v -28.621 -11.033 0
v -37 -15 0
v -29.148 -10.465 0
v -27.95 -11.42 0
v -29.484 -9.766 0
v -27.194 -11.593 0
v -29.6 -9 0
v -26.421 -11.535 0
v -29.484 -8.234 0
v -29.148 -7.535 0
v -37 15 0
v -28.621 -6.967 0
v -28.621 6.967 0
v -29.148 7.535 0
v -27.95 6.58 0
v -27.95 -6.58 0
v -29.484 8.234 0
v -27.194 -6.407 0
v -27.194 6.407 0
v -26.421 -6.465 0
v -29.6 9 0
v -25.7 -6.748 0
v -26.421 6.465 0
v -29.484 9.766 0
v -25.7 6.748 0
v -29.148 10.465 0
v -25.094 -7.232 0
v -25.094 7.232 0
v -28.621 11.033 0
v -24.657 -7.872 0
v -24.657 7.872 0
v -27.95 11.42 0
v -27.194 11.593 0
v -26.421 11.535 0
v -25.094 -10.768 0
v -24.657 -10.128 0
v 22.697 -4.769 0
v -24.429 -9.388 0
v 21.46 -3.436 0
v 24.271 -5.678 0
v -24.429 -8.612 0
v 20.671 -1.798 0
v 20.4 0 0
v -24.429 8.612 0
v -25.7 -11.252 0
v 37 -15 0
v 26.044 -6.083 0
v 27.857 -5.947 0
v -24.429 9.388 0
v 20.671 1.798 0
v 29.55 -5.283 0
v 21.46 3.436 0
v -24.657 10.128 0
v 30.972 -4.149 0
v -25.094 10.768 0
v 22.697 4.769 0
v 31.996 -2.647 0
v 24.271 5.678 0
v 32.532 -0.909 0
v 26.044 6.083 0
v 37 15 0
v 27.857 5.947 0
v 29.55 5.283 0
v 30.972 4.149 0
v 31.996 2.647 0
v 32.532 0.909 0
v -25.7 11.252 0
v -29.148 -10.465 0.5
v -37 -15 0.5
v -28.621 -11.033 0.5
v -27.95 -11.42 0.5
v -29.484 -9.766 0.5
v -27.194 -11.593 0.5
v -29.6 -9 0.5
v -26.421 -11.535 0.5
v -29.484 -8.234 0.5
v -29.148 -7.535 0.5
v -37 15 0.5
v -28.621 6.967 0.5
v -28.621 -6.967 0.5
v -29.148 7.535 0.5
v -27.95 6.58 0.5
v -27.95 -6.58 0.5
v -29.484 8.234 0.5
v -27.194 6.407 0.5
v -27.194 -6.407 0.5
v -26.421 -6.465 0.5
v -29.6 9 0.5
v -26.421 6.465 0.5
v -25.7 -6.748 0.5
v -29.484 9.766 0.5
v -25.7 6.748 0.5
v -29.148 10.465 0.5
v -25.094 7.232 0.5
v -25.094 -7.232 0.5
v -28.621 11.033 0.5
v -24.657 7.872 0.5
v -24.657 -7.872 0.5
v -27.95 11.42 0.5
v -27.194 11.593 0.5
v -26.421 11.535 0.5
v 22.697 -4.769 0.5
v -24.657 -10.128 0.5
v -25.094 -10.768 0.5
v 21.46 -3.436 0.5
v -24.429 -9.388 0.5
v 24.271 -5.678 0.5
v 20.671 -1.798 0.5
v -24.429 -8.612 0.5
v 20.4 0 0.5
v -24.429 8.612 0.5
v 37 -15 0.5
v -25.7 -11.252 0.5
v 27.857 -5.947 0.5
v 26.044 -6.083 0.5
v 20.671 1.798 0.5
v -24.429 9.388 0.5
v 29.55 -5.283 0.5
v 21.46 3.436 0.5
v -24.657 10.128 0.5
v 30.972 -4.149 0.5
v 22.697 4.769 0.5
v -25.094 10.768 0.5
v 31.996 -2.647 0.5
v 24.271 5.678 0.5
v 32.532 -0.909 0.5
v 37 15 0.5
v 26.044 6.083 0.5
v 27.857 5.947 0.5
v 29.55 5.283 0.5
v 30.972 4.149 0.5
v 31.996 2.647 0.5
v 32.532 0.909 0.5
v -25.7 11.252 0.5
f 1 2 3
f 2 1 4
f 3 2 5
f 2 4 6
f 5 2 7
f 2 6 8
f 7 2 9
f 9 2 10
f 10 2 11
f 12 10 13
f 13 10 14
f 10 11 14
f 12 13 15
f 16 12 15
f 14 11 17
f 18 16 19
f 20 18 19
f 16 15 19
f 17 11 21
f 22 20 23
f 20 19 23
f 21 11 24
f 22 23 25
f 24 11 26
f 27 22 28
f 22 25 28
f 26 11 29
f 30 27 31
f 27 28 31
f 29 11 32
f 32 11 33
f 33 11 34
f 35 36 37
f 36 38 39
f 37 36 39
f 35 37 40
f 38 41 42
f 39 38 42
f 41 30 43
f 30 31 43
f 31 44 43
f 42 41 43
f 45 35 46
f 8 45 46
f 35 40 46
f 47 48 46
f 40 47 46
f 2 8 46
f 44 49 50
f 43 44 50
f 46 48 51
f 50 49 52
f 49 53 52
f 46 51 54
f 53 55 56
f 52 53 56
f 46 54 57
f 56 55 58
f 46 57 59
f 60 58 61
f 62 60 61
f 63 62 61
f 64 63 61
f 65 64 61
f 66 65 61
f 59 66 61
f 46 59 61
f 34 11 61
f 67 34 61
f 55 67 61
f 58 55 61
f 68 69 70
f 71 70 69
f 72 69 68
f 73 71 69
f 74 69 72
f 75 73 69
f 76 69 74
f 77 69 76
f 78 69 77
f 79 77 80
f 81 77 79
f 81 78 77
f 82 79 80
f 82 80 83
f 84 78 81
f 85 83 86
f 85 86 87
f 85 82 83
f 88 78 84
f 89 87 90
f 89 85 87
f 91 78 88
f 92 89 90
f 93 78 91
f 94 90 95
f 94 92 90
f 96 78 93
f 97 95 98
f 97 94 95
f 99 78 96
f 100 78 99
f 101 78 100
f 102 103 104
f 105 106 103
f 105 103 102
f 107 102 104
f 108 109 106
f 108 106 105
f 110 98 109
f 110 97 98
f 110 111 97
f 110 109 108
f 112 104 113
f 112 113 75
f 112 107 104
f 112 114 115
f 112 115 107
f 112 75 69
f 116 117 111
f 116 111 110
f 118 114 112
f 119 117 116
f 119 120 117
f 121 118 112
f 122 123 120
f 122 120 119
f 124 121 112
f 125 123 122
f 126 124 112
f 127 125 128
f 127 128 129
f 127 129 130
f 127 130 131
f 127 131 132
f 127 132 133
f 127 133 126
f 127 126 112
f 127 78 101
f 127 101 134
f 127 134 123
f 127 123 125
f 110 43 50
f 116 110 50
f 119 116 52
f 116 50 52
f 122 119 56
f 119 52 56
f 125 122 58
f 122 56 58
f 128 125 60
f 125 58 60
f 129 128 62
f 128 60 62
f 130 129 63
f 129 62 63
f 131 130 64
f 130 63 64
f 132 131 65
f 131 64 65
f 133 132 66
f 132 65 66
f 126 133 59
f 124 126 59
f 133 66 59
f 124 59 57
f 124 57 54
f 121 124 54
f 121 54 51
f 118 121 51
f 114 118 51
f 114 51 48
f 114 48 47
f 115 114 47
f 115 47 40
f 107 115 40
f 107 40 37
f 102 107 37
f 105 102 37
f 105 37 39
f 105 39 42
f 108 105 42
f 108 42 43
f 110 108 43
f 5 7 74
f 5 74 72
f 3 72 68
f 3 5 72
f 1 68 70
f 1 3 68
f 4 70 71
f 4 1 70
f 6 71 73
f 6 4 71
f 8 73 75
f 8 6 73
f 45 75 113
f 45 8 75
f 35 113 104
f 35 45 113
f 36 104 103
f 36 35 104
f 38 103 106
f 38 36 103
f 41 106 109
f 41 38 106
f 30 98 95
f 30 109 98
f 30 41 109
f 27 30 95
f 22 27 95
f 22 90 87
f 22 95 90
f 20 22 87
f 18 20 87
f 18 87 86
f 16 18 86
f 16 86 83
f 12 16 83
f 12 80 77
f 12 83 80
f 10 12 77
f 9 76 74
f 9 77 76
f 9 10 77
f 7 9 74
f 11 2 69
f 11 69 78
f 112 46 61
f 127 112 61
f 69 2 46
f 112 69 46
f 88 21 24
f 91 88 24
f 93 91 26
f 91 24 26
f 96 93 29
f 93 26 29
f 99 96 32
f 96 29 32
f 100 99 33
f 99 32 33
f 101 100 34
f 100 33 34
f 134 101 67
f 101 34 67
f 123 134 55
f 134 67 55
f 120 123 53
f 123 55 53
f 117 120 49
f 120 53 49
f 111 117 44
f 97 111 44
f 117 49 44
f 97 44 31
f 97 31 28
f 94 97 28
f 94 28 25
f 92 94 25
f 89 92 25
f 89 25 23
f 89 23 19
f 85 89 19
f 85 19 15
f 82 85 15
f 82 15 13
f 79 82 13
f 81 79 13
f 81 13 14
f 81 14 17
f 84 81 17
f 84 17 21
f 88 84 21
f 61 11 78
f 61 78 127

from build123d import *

# Parameters (mm, degrees)
SKETCH1_W                    = 74
SKETCH1_H                    = 30
BASE_FLANGE1_DEPTH           = 0.5
F_5_2_5_2_DIAMETER_HOLE1_D   = 5.2
F_12_2_12_2_DIAMETER_HOLE1_D = 12.2


# Sheet-metal steps are written as plain solids
with BuildPart() as part:
    # Sketch1 → Base-Flange1 (new body)
    with BuildSketch(Plane.XY):
        Rectangle(SKETCH1_W, SKETCH1_H)
    extrude(amount=BASE_FLANGE1_DEPTH)

    # Ø5.2 (5.2) Diameter Hole1 (through all)
    with Locations(Plane.XY.offset(0.5)):
        with Locations((-27, 9)):
            f_5_2_5_2_diameter_hole1 = Hole(F_5_2_5_2_DIAMETER_HOLE1_D / 2)

    # Mirror1: Ø5.2 (5.2) Diameter Hole1 across plane
    add(f_5_2_5_2_diameter_hole1.mirror(Plane.ZX), mode=Mode.SUBTRACT)

    # Ø12.2 (12.2) Diameter Hole1 (through all)
    with Locations(Plane.XY.offset(0.5)):
        with Locations((26.5, 0)):
            Hole(F_12_2_12_2_DIAMETER_HOLE1_D / 2)


solid = part.part
